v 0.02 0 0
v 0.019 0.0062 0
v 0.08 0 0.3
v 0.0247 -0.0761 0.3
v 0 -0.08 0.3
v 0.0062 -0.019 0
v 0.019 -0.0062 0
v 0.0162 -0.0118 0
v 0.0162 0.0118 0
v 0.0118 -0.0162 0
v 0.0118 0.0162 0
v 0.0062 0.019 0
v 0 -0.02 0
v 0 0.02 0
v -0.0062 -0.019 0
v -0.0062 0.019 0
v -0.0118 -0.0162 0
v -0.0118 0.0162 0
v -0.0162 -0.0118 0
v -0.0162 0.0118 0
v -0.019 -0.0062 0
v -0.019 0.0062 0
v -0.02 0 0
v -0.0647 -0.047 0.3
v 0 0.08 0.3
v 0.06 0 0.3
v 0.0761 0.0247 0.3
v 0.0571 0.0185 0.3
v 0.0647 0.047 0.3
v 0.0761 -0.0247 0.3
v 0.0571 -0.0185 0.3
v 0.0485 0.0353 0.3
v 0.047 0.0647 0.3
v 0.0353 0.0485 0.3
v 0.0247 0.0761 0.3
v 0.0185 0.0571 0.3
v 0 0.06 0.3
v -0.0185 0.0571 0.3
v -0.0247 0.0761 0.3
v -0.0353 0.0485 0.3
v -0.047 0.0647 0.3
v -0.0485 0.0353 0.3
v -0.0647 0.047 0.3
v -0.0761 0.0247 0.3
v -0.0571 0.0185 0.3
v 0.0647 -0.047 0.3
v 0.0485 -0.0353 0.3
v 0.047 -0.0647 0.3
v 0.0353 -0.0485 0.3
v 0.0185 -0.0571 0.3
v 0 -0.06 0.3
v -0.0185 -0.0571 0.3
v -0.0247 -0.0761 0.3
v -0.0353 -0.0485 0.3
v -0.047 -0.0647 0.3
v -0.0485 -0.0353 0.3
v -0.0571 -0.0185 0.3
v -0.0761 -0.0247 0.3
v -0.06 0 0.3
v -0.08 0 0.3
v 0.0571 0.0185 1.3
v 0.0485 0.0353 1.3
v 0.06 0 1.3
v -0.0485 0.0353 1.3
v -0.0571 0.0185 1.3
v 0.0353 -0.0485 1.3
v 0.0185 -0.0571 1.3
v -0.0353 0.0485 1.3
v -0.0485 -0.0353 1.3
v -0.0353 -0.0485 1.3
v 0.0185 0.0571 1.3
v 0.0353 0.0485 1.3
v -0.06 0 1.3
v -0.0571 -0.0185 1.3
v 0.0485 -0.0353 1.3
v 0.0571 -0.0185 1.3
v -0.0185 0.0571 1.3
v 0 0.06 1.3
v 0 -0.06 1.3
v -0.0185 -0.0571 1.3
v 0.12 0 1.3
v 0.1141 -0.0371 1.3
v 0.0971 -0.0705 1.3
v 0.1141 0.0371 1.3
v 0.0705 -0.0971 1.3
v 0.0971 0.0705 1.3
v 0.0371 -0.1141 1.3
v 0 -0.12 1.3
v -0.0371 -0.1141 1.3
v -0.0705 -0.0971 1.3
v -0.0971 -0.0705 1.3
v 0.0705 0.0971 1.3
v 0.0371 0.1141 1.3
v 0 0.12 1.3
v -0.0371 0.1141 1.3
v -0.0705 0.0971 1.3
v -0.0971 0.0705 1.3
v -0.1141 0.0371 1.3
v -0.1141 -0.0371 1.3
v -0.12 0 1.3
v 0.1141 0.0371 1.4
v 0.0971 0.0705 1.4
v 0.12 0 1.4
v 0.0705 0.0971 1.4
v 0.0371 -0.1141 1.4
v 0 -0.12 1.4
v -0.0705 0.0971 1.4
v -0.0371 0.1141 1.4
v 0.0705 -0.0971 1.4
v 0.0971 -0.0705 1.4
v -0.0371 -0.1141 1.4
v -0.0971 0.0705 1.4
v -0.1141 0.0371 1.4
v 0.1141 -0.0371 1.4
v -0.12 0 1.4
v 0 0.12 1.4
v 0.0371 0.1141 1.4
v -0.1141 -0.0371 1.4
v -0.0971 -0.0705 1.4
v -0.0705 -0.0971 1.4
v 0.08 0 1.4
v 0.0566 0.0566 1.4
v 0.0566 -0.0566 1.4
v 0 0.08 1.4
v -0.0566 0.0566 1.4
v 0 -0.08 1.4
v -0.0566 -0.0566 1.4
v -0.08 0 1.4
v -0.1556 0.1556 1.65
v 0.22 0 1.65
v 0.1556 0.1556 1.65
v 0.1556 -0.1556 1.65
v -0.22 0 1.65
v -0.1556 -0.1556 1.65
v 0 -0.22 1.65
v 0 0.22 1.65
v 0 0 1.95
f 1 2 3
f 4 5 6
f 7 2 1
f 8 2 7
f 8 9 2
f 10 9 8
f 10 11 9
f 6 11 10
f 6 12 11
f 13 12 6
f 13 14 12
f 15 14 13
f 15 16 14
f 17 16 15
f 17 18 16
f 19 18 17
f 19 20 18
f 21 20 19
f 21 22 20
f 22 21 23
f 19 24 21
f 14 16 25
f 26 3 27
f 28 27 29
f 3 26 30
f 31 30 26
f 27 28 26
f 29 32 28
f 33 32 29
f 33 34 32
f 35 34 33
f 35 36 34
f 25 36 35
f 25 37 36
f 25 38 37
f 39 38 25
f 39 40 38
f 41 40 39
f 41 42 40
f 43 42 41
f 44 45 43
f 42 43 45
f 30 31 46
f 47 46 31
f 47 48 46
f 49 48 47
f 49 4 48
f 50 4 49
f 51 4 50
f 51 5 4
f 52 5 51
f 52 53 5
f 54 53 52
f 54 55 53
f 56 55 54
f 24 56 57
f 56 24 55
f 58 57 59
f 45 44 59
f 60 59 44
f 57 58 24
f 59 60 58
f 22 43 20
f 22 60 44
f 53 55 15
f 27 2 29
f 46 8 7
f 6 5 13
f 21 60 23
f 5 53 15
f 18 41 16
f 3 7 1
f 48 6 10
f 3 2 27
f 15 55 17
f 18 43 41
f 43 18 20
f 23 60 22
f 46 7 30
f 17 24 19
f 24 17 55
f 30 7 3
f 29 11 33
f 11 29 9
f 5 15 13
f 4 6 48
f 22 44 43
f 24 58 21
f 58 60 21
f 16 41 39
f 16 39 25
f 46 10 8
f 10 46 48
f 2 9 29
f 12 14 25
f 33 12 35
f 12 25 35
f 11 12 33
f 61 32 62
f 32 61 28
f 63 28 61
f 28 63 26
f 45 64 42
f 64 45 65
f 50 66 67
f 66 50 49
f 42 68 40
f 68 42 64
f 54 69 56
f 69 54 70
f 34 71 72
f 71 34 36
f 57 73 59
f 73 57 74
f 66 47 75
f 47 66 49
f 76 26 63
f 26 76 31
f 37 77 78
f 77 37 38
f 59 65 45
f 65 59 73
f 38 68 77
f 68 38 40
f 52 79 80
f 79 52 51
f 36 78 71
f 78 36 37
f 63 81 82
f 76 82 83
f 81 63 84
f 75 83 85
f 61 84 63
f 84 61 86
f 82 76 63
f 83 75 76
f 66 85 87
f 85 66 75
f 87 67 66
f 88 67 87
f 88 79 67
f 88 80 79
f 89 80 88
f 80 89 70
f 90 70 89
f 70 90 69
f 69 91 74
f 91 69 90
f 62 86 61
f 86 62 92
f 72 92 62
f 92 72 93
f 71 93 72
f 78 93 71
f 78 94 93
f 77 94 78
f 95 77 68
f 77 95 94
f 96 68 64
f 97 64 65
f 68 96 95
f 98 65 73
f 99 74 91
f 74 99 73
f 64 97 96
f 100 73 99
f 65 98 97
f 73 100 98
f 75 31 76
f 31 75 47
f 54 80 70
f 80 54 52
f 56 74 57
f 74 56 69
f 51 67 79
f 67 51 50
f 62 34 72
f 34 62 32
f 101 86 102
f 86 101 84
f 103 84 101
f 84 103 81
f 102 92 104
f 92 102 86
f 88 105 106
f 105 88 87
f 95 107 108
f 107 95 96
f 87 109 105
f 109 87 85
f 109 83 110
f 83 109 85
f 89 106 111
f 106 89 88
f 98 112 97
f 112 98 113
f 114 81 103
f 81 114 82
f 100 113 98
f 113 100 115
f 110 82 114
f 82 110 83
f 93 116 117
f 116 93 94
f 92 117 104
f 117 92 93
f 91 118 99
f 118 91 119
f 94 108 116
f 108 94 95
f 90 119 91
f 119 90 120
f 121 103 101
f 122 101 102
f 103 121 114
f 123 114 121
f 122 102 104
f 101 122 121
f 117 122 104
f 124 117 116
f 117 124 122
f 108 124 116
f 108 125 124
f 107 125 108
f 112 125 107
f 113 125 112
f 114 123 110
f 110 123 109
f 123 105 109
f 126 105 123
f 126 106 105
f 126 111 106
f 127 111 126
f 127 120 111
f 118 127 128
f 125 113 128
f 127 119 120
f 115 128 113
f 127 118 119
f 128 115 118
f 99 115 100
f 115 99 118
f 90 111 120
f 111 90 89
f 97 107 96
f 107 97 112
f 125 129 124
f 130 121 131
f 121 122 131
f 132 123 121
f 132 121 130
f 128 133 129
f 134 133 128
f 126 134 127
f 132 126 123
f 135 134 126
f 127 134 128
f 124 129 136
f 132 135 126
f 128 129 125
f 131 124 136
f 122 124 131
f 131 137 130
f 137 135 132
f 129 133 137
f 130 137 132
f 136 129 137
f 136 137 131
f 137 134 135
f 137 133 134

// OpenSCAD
// cluster_pin.scad
// In-scene 3D tactical candidate pin.
// Ground contact point is at (0, 0, 0), stem extends up along +Z.
// Authored for WoWViewer in-scene 3D spatial UI.

$fn = 20;

module cluster_pin() {
    // Ground contact tip at origin
    cylinder(r1 = 0.02, r2 = 0.08, h = 0.3, center = false);

    // Main slender stem
    translate([0, 0, 0.3])
    cylinder(r = 0.06, h = 1.0, center = false);

    // Upper ring collar
    translate([0, 0, 1.3])
    cylinder(r = 0.12, h = 0.1, center = false);

    // Top beacon crown (faceted diamond / double cone)
    translate([0, 0, 1.4])
    cylinder(r1 = 0.08, r2 = 0.22, h = 0.25, center = false, $fn = 8);

    translate([0, 0, 1.65])
    cylinder(r1 = 0.22, r2 = 0.0, h = 0.3, center = false, $fn = 8);
}

cluster_pin();
